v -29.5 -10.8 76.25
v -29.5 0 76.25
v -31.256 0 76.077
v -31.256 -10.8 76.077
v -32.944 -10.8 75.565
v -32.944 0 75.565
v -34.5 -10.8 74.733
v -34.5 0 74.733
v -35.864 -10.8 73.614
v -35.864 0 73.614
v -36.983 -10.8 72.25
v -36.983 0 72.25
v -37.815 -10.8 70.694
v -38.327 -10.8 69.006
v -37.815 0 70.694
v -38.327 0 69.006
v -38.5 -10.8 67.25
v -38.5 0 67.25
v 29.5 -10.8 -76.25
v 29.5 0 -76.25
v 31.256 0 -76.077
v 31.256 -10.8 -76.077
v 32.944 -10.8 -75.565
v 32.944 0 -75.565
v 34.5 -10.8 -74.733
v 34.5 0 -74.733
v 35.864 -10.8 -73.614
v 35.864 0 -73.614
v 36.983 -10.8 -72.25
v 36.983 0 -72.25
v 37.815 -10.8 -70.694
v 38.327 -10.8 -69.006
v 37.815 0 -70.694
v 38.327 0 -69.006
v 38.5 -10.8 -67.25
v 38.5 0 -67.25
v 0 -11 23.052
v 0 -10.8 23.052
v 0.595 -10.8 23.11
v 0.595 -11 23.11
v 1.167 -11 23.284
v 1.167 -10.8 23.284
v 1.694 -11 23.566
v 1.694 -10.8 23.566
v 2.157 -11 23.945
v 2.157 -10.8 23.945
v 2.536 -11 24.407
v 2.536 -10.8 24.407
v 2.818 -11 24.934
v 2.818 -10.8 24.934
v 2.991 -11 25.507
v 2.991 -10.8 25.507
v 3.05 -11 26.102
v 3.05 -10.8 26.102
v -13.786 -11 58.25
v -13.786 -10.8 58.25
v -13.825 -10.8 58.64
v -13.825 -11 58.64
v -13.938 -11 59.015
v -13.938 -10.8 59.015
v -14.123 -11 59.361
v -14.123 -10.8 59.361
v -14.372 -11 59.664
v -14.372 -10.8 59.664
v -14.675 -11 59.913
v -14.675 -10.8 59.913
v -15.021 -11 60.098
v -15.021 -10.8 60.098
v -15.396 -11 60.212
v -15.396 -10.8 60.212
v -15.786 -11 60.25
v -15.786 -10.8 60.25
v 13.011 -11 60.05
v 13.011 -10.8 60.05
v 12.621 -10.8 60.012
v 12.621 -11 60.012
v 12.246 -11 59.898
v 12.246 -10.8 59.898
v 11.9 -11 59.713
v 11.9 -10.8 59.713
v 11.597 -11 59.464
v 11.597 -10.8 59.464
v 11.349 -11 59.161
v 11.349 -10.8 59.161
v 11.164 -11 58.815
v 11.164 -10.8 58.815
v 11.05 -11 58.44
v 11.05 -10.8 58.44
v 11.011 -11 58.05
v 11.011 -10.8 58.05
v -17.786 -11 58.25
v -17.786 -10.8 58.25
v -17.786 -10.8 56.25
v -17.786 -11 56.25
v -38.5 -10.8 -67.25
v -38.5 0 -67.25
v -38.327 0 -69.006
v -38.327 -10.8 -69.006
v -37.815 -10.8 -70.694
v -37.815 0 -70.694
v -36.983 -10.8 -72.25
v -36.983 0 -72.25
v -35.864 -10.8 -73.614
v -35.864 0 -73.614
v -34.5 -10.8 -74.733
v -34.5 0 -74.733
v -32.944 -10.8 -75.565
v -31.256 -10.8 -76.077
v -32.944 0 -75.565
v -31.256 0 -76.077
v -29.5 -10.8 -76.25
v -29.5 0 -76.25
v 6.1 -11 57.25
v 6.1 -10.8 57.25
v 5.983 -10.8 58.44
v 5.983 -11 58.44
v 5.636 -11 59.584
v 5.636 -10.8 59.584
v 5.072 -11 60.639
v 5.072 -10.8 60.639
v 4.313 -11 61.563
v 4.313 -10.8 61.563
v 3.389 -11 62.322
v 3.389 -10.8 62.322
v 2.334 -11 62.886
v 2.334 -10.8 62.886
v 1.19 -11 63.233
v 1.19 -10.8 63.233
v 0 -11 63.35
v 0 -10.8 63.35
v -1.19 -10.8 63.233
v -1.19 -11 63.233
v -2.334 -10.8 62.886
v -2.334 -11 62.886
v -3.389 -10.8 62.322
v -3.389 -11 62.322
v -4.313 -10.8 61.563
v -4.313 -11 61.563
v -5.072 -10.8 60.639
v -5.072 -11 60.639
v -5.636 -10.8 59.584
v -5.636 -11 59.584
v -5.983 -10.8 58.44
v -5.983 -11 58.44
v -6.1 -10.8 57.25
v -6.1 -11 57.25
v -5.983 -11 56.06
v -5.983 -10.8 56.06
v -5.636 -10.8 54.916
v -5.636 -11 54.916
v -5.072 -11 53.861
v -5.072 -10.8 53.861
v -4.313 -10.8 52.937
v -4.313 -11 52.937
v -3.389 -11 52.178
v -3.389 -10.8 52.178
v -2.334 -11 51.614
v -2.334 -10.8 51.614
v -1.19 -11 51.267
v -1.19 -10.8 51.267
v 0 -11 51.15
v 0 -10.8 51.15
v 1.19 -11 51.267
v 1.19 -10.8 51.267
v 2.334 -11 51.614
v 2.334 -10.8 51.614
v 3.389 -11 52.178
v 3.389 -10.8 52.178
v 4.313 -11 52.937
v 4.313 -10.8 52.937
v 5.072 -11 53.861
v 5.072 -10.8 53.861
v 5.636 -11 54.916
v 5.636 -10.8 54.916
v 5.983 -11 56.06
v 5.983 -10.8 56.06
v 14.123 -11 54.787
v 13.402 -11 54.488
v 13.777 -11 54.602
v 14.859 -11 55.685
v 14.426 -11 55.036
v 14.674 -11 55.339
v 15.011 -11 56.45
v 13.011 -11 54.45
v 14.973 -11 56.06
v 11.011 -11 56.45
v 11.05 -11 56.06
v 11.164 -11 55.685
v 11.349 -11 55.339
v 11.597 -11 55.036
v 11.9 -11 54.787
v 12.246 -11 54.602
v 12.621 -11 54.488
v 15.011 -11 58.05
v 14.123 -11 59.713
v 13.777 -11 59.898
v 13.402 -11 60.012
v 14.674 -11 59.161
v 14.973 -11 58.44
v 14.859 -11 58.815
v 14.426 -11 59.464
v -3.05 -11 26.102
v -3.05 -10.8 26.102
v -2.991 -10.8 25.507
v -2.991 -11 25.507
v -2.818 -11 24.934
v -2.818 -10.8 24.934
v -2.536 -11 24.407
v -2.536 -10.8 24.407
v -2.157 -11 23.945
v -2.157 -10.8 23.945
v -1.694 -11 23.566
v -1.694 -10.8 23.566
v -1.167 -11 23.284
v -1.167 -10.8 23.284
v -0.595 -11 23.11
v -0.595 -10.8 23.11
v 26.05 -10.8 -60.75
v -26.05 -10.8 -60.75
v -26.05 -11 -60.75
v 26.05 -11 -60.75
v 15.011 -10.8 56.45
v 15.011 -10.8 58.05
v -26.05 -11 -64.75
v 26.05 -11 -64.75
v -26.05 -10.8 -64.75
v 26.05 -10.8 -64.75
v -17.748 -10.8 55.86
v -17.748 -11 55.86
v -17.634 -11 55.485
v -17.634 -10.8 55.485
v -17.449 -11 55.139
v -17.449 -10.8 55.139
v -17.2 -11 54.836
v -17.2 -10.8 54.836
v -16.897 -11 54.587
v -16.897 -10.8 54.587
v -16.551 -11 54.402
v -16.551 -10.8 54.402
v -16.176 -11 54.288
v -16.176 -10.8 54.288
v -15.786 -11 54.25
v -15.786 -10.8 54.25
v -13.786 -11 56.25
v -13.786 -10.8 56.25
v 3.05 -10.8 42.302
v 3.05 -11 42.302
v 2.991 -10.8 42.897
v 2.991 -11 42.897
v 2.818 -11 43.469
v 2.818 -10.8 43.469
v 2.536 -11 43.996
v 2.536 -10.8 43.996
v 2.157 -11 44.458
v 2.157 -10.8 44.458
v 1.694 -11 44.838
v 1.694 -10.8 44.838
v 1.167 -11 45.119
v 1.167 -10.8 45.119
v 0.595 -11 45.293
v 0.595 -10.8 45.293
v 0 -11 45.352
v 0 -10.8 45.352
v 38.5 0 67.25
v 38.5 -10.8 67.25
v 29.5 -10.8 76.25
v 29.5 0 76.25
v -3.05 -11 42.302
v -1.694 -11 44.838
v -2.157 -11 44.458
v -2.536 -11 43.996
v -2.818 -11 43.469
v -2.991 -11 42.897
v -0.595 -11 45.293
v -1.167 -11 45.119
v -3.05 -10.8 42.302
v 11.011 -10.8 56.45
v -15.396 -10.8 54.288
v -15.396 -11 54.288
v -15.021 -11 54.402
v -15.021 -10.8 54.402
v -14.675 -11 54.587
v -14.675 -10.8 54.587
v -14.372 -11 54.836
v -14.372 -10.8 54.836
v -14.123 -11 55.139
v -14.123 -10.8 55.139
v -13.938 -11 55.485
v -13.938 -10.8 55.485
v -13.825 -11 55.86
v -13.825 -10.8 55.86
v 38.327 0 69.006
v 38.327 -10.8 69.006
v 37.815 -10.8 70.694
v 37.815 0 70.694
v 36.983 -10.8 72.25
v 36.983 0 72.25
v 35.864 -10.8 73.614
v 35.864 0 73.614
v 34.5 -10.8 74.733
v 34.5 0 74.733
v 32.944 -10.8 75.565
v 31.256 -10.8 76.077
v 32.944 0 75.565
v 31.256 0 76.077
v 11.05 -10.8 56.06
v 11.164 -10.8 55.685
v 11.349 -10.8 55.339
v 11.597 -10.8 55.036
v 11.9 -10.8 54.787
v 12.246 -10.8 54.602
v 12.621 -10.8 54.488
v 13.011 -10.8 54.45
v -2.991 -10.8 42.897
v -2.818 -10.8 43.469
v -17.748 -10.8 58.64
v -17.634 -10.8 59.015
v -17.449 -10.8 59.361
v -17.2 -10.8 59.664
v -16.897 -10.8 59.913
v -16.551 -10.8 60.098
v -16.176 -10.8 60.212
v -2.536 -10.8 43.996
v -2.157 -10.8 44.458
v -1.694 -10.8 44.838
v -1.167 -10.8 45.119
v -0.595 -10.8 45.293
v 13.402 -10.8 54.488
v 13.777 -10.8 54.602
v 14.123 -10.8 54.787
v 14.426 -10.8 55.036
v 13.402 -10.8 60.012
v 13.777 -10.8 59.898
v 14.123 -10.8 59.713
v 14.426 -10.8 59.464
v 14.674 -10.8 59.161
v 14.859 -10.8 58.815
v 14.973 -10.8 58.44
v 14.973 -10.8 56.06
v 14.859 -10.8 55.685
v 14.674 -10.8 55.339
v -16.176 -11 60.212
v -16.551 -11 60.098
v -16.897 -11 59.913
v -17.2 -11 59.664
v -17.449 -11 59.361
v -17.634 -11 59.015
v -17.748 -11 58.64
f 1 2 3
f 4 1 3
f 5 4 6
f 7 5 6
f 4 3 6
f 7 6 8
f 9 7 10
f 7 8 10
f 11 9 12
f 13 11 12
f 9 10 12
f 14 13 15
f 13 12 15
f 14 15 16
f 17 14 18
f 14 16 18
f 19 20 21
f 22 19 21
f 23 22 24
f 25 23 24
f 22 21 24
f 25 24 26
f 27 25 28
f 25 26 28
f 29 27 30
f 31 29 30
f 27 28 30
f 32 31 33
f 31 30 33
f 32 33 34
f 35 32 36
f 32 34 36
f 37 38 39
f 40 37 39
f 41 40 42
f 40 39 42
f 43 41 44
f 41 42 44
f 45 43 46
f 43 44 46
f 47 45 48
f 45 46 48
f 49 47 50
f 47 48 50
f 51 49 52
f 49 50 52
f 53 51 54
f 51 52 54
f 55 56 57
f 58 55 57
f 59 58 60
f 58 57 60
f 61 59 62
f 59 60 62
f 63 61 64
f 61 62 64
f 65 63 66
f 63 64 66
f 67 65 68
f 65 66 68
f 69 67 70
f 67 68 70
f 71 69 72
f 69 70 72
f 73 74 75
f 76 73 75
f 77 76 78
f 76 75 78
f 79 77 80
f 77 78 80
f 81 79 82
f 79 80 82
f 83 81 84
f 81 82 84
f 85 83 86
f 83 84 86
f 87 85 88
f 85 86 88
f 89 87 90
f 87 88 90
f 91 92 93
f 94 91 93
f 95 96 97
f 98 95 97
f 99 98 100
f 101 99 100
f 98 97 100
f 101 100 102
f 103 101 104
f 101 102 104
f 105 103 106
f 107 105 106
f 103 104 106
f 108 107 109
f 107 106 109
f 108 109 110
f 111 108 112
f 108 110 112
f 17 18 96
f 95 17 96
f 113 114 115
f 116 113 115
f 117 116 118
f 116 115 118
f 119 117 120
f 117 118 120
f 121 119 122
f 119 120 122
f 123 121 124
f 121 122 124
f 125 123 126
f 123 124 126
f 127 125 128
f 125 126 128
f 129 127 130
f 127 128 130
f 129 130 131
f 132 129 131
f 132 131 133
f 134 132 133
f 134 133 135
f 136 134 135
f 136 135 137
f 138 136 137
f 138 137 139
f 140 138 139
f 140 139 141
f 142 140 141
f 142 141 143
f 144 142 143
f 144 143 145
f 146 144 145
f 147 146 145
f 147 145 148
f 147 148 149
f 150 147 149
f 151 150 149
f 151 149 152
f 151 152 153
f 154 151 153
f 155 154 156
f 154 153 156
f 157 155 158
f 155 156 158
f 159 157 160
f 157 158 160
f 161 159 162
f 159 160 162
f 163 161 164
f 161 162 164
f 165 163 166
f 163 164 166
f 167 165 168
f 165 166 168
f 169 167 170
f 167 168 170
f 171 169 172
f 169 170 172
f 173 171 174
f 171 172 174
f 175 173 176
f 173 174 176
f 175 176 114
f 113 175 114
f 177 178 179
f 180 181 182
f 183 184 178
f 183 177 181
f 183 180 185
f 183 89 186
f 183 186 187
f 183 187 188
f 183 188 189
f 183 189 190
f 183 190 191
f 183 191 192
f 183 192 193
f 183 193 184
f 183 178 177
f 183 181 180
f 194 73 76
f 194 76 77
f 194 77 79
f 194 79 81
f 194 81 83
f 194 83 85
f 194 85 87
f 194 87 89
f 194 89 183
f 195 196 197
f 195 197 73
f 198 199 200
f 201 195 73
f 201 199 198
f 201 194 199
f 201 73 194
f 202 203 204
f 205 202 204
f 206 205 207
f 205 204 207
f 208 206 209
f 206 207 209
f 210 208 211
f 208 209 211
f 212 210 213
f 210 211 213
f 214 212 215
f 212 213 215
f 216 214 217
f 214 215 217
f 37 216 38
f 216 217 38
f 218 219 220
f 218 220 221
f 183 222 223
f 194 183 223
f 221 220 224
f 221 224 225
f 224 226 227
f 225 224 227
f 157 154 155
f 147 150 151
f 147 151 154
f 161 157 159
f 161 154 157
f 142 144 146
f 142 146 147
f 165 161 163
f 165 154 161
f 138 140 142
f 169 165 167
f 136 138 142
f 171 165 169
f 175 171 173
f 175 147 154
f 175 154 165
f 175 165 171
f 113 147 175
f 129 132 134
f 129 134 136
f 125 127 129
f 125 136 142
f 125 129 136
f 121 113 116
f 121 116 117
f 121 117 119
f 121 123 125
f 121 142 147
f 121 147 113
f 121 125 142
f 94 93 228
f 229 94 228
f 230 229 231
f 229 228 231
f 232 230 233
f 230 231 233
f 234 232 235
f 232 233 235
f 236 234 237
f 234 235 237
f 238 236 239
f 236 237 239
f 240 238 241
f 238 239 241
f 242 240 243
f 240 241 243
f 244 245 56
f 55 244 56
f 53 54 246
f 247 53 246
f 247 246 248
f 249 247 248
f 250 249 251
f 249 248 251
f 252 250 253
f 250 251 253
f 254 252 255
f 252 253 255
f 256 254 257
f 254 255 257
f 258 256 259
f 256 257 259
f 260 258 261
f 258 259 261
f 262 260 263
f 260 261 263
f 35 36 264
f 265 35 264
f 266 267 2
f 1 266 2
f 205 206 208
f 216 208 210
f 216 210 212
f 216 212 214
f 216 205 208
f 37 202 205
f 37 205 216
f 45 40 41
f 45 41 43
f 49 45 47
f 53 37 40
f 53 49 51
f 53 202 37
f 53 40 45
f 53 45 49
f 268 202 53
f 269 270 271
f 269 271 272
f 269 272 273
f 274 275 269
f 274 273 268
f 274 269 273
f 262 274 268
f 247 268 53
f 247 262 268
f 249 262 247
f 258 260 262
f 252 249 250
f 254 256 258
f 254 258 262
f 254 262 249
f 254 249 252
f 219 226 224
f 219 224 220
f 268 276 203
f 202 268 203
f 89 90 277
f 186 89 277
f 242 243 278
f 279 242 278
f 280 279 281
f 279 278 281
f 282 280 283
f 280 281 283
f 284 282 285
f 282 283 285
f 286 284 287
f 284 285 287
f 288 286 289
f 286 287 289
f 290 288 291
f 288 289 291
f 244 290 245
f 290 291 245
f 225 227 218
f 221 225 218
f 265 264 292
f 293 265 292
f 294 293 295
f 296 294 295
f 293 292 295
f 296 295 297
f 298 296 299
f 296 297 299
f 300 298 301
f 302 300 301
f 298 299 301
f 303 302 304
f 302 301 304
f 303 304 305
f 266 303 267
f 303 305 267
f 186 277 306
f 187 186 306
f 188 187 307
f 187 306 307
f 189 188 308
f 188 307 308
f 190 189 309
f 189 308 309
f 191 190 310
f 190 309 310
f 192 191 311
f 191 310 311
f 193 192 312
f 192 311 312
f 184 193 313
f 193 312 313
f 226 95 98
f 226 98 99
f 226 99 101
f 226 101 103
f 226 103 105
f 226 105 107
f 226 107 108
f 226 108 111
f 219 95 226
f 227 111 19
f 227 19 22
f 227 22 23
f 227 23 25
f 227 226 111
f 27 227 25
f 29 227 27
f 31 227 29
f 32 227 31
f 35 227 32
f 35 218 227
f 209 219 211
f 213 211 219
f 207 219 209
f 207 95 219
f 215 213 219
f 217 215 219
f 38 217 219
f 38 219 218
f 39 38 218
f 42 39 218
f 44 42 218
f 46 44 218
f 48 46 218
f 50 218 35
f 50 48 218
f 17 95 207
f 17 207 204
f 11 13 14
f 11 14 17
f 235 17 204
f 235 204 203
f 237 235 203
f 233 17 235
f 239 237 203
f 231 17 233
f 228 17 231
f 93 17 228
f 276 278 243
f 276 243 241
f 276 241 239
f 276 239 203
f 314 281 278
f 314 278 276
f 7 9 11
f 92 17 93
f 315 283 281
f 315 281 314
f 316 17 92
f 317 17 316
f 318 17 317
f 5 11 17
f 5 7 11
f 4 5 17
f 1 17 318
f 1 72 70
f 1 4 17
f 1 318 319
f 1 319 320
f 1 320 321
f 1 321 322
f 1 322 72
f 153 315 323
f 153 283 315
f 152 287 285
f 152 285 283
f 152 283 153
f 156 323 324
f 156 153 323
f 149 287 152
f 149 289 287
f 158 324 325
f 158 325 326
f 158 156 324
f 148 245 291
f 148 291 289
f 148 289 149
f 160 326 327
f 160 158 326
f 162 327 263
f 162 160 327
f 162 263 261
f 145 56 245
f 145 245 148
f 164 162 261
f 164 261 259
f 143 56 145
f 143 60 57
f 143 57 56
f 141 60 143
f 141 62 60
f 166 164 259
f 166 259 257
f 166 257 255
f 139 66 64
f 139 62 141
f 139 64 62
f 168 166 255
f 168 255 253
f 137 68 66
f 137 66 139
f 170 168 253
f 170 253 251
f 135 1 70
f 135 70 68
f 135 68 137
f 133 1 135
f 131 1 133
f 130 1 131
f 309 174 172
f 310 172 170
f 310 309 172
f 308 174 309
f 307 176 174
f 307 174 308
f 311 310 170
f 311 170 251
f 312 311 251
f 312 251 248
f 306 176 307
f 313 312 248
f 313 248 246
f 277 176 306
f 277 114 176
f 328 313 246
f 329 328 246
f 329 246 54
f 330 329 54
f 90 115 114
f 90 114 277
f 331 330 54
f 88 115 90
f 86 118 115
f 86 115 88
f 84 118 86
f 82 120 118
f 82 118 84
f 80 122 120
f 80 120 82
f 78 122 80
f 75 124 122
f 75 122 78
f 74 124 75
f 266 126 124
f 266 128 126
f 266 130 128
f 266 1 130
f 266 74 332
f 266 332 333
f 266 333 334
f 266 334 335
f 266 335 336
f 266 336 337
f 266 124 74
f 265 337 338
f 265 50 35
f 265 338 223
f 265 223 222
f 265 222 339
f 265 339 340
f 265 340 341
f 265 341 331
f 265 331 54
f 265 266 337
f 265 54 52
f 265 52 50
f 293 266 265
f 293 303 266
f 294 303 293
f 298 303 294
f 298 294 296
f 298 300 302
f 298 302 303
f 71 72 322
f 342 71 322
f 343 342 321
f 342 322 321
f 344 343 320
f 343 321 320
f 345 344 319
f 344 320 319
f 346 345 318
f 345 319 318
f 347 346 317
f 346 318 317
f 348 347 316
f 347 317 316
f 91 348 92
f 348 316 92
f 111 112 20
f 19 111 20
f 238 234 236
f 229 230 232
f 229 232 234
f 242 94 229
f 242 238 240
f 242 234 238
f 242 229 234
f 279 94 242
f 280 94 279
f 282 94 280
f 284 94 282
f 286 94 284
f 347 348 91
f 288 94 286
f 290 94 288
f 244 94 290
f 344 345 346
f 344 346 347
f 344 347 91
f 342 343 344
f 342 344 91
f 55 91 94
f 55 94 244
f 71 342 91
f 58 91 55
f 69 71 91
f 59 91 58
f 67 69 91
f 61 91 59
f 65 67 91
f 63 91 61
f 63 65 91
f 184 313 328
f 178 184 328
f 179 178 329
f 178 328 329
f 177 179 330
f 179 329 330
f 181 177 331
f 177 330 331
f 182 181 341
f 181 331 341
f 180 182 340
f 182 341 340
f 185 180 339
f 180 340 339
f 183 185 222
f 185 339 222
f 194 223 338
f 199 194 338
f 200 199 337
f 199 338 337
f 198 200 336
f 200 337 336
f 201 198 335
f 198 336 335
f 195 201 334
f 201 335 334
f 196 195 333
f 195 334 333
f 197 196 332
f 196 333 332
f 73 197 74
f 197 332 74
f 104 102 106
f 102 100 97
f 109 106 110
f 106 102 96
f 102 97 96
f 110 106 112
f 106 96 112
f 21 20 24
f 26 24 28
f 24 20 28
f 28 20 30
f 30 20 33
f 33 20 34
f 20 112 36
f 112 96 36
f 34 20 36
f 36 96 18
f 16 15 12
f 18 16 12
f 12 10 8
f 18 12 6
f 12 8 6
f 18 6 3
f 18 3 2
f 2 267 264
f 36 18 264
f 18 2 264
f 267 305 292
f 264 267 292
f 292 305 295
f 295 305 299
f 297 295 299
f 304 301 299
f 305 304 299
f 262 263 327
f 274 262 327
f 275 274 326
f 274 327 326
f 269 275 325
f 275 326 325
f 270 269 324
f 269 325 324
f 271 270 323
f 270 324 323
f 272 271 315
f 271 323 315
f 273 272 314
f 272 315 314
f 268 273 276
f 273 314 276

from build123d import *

# Parameters (mm, degrees)
F0_W     = 52.1
F0_H     = 4
F0_R     = 6.1
F1_DEPTH = 10.8
F2_DEPTH = 11


with BuildPart() as f1:
    # F0 (on Front) → F1 (new body)
    with BuildSketch(Plane.XZ):
        with BuildLine():
            Line((-29.5, -76.25), (29.5, -76.25))
            ThreePointArc((29.5, -76.25), (35.863961, -73.613961), (38.5, -67.25))
            Line((38.5, -67.25), (38.5, 67.25))
            ThreePointArc((38.5, 67.25), (35.863961, 73.613961), (29.5, 76.25))
            Line((29.5, 76.25), (-29.5, 76.25))
            ThreePointArc((-29.5, 76.25), (-35.863961, 73.613961), (-38.5, 67.25))
            Line((-38.5, 67.25), (-38.5, -67.25))
            ThreePointArc((-38.5, -67.25), (-35.863961, -73.613961), (-29.5, -76.25))
        make_face()
        with Locations((0, -62.75)):
            Rectangle(F0_W, F0_H, mode=Mode.SUBTRACT)
        with BuildLine():
            Line((-13.786121, 58.25), (-13.786121, 56.25))
            ThreePointArc((-13.786121, 56.25), (-14.371908, 54.835786), (-15.786121, 54.25))
            ThreePointArc((-15.786121, 54.25), (-17.200335, 54.835786), (-17.786121, 56.25))
            Line((-17.786121, 56.25), (-17.786121, 58.25))
            ThreePointArc((-17.786121, 58.25), (-17.200335, 59.664214), (-15.786121, 60.25))
            ThreePointArc((-15.786121, 60.25), (-14.371908, 59.664214), (-13.786121, 58.25))
        make_face(mode=Mode.SUBTRACT)
        with BuildLine():
            Line((3.05, 42.301566), (3.05, 26.101566))
            ThreePointArc((3.05, 26.101566), (2.156676, 23.94489), (0, 23.051566))
            ThreePointArc((0, 23.051566), (-2.156676, 23.94489), (-3.05, 26.101566))
            Line((-3.05, 26.101566), (-3.05, 42.301566))
            ThreePointArc((-3.05, 42.301566), (-2.156676, 44.458242), (0, 45.351566))
            ThreePointArc((0, 45.351566), (2.156676, 44.458242), (3.05, 42.301566))
        make_face(mode=Mode.SUBTRACT)
        with Locations((0, 57.25)):
            Circle(F0_R, mode=Mode.SUBTRACT)
        with BuildLine():
            Line((15.011477, 58.05), (15.011477, 56.45))
            ThreePointArc((15.011477, 56.45), (14.425691, 55.035786), (13.011477, 54.45))
            ThreePointArc((13.011477, 54.45), (11.597264, 55.035786), (11.011477, 56.45))
            Line((11.011477, 56.45), (11.011477, 58.05))
            ThreePointArc((11.011477, 58.05), (11.597264, 59.464214), (13.011477, 60.05))
            ThreePointArc((13.011477, 60.05), (14.425691, 59.464214), (15.011477, 58.05))
        make_face(mode=Mode.SUBTRACT)
    extrude(amount=F1_DEPTH)

    # F0 (on Front) → F2 (join)
    with BuildSketch(Plane.XZ):
        with Locations((0, 57.25)):
            Circle(F0_R)
        with BuildLine():
            ThreePointArc((-15.786121, 54.25), (-14.371908, 54.835786), (-13.786121, 56.25))
            Line((-13.786121, 56.25), (-13.786121, 58.25))
            ThreePointArc((-13.786121, 58.25), (-14.371908, 59.664214), (-15.786121, 60.25))
            ThreePointArc((-15.786121, 60.25), (-17.200335, 59.664214), (-17.786121, 58.25))
            Line((-17.786121, 58.25), (-17.786121, 56.25))
            ThreePointArc((-17.786121, 56.25), (-17.200335, 54.835786), (-15.786121, 54.25))
        make_face()
        with BuildLine():
            ThreePointArc((13.011477, 54.45), (14.425691, 55.035786), (15.011477, 56.45))
            Line((15.011477, 56.45), (15.011477, 58.05))
            ThreePointArc((15.011477, 58.05), (14.425691, 59.464214), (13.011477, 60.05))
            ThreePointArc((13.011477, 60.05), (11.597264, 59.464214), (11.011477, 58.05))
            Line((11.011477, 58.05), (11.011477, 56.45))
            ThreePointArc((11.011477, 56.45), (11.597264, 55.035786), (13.011477, 54.45))
        make_face()
        with BuildLine():
            ThreePointArc((0, 23.051566), (2.156676, 23.94489), (3.05, 26.101566))
            Line((3.05, 26.101566), (3.05, 42.301566))
            ThreePointArc((3.05, 42.301566), (2.156676, 44.458242), (0, 45.351566))
            ThreePointArc((0, 45.351566), (-2.156676, 44.458242), (-3.05, 42.301566))
            Line((-3.05, 42.301566), (-3.05, 26.101566))
            ThreePointArc((-3.05, 26.101566), (-2.156676, 23.94489), (0, 23.051566))
        make_face()
        with Locations((0, -62.75)):
            Rectangle(F0_W, F0_H)
    extrude(amount=F2_DEPTH)


solid = f1.part
